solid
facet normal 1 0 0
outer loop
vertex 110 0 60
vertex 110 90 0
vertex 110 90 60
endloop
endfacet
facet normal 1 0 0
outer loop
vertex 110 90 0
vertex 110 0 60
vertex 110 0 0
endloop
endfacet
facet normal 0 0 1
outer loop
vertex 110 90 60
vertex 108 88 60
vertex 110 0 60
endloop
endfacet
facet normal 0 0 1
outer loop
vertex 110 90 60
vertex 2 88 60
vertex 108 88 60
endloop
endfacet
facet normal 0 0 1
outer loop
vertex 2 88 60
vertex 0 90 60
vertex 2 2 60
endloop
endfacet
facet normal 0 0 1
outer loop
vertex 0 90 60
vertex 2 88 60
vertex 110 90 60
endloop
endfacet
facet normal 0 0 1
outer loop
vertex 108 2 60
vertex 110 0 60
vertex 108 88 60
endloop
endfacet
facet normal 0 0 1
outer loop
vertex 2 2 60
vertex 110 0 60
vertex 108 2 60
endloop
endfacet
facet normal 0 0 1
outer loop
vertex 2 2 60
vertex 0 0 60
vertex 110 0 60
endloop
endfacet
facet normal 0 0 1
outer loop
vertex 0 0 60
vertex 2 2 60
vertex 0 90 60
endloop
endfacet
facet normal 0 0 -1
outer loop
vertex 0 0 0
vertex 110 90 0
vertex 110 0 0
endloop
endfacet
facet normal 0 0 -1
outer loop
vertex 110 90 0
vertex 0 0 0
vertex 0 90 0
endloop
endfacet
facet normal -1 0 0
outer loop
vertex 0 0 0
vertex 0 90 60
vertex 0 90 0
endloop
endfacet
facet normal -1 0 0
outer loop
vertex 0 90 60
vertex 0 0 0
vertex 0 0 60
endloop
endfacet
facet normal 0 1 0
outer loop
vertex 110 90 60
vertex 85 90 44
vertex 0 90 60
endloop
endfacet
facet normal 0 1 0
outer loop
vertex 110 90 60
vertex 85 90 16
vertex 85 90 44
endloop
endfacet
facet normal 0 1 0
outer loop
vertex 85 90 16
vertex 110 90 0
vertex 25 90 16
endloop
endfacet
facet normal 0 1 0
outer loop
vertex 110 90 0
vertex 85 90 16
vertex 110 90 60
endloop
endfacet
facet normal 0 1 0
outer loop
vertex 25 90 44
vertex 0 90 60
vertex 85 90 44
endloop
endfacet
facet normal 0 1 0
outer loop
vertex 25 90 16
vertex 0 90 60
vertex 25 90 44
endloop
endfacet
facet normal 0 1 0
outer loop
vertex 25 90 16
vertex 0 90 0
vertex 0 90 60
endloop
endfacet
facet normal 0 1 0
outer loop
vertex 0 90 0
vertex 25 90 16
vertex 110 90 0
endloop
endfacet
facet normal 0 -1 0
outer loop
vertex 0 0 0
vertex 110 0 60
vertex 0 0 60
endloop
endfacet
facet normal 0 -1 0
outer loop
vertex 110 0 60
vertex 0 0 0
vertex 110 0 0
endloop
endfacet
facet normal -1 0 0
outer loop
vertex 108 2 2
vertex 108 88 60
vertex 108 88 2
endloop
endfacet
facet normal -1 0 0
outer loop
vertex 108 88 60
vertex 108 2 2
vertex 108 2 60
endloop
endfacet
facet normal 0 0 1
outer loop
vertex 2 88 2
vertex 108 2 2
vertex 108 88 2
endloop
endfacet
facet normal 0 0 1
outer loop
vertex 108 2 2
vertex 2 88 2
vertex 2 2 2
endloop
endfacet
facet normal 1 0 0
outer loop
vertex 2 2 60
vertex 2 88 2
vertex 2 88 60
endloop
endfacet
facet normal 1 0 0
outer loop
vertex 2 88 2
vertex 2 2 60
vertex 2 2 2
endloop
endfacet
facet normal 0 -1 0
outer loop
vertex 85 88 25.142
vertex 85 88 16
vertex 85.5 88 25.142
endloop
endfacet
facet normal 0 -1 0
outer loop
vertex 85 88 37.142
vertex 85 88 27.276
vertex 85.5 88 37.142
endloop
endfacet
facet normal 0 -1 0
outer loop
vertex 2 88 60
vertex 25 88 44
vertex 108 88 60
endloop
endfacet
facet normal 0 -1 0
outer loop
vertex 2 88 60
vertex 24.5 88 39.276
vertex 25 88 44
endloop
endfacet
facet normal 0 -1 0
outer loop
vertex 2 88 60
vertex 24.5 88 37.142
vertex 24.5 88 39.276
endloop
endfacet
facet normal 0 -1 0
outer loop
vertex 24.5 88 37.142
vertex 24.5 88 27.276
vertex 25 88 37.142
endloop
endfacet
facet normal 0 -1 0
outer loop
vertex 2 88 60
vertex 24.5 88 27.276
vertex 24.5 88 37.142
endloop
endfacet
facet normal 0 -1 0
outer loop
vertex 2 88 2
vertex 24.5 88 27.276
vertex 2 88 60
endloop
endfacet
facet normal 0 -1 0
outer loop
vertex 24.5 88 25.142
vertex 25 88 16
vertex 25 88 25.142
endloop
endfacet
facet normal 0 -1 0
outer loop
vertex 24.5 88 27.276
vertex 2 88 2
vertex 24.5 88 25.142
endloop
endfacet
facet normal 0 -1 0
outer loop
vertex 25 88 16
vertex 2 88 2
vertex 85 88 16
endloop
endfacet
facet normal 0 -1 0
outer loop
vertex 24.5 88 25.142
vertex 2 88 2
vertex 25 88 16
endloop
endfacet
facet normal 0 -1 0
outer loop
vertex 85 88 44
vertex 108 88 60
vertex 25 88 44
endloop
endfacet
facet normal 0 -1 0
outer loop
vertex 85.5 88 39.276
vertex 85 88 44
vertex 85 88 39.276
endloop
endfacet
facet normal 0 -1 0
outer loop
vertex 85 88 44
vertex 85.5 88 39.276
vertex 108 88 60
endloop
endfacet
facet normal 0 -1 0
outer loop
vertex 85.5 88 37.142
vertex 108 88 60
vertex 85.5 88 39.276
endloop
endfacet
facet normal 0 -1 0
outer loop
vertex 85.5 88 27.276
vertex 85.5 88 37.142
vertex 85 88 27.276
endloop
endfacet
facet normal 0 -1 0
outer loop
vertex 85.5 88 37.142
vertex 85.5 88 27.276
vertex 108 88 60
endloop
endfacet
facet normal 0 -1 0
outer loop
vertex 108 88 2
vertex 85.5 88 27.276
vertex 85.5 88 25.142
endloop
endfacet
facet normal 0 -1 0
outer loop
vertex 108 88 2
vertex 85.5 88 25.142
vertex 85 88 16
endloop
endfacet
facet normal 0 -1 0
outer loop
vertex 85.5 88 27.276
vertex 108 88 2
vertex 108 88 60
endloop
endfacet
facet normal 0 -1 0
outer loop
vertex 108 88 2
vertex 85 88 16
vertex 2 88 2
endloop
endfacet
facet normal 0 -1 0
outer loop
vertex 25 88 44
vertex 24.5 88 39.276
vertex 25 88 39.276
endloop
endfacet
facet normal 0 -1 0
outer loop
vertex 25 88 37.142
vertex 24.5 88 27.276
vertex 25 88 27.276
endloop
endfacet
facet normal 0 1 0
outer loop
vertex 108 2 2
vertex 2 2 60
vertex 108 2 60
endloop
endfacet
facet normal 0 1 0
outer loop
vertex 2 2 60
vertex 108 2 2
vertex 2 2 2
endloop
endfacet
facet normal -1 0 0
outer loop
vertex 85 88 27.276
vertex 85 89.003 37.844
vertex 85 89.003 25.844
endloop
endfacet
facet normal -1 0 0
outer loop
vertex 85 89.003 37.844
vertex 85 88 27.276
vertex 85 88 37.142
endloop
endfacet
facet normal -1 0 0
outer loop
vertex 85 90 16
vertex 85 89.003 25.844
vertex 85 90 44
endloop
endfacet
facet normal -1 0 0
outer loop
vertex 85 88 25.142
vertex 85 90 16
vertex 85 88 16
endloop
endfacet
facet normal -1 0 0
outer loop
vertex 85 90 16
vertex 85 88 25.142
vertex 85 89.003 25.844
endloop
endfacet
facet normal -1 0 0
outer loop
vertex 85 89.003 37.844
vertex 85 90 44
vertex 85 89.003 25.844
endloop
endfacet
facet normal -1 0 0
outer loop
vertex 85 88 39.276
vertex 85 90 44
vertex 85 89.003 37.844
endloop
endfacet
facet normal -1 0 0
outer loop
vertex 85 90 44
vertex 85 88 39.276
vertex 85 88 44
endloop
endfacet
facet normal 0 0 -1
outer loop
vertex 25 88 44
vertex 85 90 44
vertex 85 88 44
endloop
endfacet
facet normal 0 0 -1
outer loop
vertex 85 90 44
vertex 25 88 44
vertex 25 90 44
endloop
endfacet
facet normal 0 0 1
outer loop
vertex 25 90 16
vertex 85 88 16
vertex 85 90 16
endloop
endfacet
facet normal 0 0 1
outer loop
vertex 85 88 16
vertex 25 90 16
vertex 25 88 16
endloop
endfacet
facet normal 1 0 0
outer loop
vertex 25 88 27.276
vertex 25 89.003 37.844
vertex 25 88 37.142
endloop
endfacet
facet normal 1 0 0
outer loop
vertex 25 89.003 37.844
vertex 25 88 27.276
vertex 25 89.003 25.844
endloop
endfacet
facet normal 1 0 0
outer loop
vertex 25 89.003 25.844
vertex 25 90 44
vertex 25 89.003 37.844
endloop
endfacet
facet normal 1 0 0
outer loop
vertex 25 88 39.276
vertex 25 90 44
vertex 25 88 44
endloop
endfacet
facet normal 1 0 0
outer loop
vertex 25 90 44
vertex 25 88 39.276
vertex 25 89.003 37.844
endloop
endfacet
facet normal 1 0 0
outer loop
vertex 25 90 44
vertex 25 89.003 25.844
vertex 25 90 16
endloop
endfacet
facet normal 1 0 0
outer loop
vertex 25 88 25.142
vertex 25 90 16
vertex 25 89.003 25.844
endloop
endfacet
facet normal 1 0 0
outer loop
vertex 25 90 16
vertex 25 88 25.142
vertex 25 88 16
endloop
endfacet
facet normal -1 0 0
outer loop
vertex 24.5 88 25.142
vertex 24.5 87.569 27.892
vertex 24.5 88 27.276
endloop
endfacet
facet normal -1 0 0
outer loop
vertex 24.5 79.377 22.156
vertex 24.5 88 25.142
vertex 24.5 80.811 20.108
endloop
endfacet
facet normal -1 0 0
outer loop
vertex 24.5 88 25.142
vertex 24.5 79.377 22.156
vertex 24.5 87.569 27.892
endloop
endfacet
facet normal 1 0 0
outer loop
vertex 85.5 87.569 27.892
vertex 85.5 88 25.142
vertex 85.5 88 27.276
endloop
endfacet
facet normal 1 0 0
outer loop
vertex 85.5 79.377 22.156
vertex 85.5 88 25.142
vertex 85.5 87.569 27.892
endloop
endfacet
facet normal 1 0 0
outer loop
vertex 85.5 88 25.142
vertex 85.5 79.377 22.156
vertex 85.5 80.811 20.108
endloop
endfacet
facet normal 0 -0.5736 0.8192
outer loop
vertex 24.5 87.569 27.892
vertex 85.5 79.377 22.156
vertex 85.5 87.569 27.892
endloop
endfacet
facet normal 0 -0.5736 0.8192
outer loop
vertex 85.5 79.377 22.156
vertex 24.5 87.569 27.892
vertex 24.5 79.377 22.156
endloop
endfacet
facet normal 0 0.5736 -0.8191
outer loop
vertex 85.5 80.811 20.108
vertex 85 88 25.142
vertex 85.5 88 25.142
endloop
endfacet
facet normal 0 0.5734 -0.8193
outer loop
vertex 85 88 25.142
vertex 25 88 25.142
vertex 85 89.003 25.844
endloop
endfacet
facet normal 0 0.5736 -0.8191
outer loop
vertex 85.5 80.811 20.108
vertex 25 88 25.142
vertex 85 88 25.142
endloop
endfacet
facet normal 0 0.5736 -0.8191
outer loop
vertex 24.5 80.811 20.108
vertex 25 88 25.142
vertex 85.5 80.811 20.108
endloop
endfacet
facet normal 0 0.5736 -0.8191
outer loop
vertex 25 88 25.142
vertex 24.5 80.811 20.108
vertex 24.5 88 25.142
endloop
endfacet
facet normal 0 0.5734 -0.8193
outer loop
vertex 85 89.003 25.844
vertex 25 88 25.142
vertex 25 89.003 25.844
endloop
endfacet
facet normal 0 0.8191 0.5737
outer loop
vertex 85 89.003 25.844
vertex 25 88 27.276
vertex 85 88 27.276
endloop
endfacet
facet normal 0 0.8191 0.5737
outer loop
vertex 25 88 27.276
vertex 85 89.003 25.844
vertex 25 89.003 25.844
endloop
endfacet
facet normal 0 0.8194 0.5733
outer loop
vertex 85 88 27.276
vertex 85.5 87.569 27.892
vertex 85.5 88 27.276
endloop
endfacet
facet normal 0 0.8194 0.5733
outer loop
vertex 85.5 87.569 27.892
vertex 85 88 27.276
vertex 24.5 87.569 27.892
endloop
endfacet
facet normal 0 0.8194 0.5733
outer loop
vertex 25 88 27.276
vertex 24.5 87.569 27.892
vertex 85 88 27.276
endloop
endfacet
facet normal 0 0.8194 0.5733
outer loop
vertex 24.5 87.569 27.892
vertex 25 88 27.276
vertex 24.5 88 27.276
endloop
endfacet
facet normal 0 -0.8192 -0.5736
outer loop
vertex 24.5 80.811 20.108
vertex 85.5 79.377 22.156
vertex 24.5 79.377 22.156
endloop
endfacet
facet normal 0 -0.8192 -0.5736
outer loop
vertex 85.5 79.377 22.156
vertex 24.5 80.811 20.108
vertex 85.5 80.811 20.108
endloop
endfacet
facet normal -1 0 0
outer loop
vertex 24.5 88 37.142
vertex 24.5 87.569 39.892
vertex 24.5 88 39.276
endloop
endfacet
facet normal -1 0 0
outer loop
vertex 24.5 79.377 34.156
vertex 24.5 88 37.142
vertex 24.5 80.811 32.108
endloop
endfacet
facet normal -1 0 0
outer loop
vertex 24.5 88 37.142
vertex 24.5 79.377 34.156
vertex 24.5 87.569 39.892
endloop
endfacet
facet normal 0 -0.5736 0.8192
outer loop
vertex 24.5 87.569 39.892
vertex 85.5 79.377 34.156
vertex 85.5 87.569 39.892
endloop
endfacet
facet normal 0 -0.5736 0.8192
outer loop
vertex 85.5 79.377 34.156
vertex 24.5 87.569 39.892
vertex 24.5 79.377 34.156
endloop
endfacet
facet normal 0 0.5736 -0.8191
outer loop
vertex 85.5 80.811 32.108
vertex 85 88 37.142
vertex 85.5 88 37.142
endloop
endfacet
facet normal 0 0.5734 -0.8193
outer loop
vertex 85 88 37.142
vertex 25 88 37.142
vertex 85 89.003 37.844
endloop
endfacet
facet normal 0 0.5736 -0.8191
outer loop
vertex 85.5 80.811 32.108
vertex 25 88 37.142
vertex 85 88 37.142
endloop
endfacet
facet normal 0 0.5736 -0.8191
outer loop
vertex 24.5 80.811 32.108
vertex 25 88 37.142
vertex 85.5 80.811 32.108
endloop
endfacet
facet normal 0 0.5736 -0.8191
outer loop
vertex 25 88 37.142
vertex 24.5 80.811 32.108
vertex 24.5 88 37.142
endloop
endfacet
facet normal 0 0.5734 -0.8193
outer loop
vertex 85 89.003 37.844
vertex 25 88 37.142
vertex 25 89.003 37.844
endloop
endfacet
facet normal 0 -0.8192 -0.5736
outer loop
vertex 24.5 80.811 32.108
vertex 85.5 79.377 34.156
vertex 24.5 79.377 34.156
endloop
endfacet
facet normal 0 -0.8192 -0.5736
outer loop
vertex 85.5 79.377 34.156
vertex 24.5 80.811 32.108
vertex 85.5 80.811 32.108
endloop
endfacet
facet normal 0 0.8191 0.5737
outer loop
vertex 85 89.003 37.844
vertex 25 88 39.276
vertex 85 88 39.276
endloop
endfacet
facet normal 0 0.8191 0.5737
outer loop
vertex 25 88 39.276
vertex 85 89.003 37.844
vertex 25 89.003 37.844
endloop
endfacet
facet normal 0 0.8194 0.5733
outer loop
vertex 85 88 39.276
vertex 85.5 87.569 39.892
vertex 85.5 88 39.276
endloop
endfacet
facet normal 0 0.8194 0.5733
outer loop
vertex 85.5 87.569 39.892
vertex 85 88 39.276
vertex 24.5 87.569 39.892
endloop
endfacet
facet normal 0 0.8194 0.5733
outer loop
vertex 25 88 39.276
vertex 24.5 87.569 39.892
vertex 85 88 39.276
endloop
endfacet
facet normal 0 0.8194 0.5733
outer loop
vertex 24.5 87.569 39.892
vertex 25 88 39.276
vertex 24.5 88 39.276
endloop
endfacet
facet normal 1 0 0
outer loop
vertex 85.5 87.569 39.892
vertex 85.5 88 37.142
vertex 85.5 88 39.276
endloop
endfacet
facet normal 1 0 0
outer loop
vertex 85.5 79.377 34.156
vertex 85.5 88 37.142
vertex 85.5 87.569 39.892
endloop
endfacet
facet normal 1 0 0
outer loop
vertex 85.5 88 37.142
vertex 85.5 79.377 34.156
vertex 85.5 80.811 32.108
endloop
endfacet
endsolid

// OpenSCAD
$fn = 32;

// ----------------------------------------------------------------------
// Vent box: louvers enclosure
// ----------------------------------------------------------------------

// --- parameters (mm) ---
box_l = 110;              // box length, X
box_w = 90;               // box width, Y
box_h = 60;               // box height, Z
wall_t = 2;               // shell wall thickness
win_l = 60;               // vent window width, X
win_h = 28;               // vent window height, Z
slat_t = 2.5;             // louver slat thickness
slat_d = 10;              // louver slat depth
slat_a = 35;              // louver slat angle, degrees
slat_pitch = 12;          // louver pitch
slat_yc = 84.19;          // slat centreline Y

win_z0 = (box_h - win_h) / 2;  // window lower edge Z
n_slats = 2;  // louver count
slat_z0 = win_z0 + (win_h - (n_slats - 1) * slat_pitch) / 2;

difference() {
  union() {
    difference() {
      cube([box_l, box_w, box_h]);
  translate([wall_t, wall_t, wall_t])
    cube([box_l - 2 * wall_t, box_w - 2 * wall_t, box_h]);
  translate([(box_l - win_l) / 2, box_w - wall_t - 1, win_z0])
    cube([win_l, wall_t + 2, win_h]);
    }
    for (i = [0 : n_slats - 1])
      translate([box_l / 2, slat_yc, slat_z0 + i * slat_pitch])
        rotate([slat_a, 0, 0])
          cube([win_l + 1, slat_d, slat_t], center = true);
  }
}
